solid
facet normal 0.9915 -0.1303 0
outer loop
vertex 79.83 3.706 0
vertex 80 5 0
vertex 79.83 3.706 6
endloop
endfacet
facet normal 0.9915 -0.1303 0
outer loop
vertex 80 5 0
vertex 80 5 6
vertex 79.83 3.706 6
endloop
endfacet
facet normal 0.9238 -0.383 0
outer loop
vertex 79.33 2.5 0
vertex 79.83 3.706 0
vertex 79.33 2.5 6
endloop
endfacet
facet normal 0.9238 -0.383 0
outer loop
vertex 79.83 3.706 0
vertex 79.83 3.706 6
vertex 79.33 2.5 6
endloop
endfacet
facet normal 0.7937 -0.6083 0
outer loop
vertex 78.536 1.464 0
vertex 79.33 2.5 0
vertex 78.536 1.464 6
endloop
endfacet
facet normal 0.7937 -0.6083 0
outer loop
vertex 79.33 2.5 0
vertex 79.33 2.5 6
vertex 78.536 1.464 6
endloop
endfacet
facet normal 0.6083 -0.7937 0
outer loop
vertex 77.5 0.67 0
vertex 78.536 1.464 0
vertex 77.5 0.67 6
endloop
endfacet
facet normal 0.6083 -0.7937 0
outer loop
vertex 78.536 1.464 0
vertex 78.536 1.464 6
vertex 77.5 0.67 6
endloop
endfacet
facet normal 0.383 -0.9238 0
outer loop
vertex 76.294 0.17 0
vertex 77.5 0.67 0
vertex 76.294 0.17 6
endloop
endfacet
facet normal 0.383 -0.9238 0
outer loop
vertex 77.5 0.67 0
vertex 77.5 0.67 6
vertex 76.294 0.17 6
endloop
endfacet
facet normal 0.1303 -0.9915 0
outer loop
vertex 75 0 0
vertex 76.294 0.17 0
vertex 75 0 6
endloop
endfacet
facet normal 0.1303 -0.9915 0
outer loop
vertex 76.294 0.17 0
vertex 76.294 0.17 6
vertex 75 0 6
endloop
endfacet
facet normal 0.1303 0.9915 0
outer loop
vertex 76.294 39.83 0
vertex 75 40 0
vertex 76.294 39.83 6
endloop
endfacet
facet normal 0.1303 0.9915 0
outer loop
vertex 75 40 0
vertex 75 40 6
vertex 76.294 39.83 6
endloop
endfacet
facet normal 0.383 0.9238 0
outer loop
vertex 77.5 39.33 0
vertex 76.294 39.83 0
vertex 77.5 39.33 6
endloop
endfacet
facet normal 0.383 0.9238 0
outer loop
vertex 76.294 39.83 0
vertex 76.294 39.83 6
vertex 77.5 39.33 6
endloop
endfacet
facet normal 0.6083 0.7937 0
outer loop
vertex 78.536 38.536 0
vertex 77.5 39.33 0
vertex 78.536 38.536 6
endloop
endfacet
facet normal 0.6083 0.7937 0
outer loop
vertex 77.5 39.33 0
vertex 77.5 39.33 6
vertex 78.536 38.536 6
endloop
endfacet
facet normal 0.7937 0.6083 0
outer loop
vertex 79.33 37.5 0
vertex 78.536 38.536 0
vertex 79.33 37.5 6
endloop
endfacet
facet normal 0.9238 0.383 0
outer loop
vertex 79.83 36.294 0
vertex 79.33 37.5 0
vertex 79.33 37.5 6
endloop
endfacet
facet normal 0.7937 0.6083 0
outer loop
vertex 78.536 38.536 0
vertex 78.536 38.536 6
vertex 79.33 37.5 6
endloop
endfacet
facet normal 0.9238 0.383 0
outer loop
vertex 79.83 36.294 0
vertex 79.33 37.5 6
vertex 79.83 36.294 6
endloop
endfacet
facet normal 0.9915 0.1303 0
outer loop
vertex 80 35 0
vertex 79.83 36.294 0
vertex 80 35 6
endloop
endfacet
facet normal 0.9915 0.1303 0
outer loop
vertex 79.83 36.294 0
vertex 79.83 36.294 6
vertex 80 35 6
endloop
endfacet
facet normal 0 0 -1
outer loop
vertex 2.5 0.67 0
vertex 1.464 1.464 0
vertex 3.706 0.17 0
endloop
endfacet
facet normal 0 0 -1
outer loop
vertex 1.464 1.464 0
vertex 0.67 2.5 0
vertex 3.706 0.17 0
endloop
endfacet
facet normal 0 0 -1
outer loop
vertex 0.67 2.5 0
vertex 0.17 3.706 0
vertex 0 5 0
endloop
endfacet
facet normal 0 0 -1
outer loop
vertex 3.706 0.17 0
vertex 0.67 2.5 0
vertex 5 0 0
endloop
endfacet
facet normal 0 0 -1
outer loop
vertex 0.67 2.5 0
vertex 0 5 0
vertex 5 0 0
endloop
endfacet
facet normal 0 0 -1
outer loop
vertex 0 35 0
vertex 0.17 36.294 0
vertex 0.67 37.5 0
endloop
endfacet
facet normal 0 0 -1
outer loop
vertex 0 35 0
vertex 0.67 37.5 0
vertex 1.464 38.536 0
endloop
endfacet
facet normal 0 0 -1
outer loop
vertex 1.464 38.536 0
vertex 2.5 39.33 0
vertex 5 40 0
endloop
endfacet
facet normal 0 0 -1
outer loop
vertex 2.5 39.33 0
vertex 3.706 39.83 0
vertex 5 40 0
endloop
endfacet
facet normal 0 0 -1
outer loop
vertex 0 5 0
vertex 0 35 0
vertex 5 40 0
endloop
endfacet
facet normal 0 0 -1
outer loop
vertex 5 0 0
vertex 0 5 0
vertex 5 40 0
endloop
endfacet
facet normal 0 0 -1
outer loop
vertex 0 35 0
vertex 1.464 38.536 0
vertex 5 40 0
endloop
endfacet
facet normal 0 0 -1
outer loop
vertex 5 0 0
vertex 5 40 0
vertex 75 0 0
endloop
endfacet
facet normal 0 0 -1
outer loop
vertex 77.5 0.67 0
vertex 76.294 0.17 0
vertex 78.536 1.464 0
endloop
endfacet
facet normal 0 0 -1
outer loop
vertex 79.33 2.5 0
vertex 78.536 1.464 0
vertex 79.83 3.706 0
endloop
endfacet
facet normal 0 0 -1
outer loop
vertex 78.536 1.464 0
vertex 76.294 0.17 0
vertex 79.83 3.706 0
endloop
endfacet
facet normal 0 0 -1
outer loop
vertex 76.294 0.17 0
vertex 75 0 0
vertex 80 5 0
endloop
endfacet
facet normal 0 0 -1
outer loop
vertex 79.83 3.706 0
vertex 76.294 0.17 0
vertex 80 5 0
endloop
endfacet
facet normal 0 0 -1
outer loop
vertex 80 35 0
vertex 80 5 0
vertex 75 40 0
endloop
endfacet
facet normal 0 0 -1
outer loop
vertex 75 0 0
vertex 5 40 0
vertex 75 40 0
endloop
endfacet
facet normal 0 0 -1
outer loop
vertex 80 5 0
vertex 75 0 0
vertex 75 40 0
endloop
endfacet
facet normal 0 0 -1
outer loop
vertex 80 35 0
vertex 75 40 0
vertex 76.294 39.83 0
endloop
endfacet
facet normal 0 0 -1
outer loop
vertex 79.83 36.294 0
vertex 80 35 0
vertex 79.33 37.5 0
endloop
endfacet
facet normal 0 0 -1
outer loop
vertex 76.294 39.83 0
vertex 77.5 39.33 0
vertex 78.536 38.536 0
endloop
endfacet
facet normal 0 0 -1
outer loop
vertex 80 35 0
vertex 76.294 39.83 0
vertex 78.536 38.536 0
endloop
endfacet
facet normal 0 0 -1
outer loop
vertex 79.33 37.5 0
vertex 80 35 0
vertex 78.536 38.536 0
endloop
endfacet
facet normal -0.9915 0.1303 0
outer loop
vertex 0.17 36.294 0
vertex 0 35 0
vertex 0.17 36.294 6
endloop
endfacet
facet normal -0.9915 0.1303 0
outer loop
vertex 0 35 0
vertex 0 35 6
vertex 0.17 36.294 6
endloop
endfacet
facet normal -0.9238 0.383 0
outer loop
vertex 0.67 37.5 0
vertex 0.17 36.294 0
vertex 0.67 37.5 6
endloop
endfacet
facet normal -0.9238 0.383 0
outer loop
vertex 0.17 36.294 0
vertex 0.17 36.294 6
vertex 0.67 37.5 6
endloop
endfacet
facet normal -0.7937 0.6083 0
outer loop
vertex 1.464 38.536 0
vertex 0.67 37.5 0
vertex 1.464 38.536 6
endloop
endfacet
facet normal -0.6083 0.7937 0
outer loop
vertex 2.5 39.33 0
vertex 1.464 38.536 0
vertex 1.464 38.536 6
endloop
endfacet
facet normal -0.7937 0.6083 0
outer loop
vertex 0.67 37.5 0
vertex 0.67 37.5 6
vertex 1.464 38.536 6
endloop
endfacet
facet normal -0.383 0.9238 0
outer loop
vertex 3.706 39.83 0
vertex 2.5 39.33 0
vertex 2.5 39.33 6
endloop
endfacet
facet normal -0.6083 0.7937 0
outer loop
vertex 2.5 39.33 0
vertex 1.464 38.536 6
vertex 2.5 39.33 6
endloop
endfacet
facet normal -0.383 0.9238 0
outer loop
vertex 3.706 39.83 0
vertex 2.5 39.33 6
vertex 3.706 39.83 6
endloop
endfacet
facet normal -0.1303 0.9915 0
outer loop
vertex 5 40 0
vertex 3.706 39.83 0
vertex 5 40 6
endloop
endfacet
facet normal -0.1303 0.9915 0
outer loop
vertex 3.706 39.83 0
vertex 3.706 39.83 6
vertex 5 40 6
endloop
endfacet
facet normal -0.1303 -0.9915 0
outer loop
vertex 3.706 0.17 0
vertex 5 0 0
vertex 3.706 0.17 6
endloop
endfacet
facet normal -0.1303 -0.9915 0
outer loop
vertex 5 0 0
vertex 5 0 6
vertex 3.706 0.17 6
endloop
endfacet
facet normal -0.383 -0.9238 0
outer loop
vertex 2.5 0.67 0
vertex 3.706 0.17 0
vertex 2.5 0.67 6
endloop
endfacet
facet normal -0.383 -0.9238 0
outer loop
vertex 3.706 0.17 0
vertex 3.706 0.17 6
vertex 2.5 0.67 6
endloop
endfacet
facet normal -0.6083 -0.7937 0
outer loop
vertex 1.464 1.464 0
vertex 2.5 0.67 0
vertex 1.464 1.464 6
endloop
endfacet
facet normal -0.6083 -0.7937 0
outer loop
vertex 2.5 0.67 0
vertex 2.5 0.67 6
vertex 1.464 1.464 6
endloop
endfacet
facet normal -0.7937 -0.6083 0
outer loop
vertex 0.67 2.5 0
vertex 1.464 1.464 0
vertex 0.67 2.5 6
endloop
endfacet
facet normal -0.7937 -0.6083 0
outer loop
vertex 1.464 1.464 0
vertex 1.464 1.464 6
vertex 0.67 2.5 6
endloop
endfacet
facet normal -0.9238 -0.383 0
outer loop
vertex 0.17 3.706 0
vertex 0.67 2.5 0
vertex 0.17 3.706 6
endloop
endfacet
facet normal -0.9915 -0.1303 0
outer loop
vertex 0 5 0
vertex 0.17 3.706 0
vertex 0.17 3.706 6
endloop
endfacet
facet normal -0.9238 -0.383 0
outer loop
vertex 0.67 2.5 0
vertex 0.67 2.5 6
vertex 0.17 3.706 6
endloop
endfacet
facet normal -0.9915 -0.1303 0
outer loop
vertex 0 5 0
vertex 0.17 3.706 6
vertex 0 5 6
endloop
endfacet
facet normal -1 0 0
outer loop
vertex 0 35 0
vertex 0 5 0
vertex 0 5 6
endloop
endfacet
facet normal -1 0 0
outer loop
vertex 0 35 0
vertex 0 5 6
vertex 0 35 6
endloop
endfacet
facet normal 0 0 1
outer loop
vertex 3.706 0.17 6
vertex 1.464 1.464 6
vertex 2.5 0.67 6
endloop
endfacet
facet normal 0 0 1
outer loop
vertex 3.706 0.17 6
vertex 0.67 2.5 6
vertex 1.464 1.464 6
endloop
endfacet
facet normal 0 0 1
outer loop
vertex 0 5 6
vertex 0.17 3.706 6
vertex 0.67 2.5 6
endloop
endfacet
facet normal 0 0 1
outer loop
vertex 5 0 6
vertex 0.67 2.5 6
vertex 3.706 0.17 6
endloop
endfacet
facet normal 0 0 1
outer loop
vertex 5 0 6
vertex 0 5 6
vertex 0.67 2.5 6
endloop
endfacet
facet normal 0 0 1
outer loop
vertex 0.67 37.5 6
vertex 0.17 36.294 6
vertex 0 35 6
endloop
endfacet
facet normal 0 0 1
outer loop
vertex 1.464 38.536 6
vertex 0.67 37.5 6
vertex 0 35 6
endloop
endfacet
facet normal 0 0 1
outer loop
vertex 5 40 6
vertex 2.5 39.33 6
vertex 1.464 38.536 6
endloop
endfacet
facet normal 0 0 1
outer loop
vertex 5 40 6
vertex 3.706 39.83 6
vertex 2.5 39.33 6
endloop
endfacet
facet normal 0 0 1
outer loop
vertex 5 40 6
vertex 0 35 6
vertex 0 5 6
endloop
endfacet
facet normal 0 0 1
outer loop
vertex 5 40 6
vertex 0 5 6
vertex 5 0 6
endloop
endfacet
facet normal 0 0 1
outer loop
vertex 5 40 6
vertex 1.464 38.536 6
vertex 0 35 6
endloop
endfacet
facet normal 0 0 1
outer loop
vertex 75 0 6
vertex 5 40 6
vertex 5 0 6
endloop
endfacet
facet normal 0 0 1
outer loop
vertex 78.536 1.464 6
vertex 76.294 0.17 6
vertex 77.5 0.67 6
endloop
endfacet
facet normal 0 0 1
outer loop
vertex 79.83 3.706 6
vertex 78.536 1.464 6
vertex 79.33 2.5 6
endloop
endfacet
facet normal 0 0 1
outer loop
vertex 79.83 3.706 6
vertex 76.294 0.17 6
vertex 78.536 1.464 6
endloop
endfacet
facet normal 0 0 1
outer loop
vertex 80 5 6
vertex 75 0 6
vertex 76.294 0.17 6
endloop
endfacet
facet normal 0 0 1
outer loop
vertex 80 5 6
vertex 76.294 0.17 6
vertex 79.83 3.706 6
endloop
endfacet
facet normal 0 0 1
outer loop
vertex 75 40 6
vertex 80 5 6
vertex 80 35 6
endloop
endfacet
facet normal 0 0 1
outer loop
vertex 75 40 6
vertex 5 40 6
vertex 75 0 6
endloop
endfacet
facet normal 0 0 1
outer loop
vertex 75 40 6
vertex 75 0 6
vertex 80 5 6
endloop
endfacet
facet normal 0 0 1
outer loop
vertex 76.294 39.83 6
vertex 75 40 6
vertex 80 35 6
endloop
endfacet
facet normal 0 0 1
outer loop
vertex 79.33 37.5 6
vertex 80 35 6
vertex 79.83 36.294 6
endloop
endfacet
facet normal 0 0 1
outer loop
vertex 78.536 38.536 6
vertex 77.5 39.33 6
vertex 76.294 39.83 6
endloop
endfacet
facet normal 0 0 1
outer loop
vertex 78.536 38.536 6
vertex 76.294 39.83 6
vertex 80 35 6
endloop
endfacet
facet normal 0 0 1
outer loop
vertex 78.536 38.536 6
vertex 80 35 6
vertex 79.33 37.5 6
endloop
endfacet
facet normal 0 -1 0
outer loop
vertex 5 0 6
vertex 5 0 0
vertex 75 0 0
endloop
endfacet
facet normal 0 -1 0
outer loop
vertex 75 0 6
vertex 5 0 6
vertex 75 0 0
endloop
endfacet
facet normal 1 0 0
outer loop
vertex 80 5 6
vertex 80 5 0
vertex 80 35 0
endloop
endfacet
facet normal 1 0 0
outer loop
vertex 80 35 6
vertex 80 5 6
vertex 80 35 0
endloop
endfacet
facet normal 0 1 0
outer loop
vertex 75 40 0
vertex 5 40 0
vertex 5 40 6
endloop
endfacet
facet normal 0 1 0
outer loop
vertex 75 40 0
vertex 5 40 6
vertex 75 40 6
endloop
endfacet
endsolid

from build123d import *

# Parameters (mm, degrees)
F0_W     = 80
F0_H     = 40
F1_DEPTH = 6
F2_R     = 5
F3_R     = 5
F4_R     = 5
F5_R     = 5


with BuildPart() as f1:
    # F0 (on Top) → F1 (new body)
    with BuildSketch(Plane.XY):
        with Locations((40, 20)):
            Rectangle(F0_W, F0_H)
    extrude(amount=F1_DEPTH)

    # F2
    f2_edges = [f1.edges().sort_by_distance(p)[0] for p in [
        (0, 40, 3),
    ]]
    fillet(f2_edges, radius=F2_R)

    # F3
    f3_edges = [f1.edges().sort_by_distance(p)[0] for p in [
        (80, 40, 3),
    ]]
    fillet(f3_edges, radius=F3_R)

    # F4
    f4_edges = [f1.edges().sort_by_distance(p)[0] for p in [
        (80, 0, 3),
    ]]
    fillet(f4_edges, radius=F4_R)

    # F5
    f5_edges = [f1.edges().sort_by_distance(p)[0] for p in [
        (0, 0, 3),
    ]]
    fillet(f5_edges, radius=F5_R)


solid = f1.part
